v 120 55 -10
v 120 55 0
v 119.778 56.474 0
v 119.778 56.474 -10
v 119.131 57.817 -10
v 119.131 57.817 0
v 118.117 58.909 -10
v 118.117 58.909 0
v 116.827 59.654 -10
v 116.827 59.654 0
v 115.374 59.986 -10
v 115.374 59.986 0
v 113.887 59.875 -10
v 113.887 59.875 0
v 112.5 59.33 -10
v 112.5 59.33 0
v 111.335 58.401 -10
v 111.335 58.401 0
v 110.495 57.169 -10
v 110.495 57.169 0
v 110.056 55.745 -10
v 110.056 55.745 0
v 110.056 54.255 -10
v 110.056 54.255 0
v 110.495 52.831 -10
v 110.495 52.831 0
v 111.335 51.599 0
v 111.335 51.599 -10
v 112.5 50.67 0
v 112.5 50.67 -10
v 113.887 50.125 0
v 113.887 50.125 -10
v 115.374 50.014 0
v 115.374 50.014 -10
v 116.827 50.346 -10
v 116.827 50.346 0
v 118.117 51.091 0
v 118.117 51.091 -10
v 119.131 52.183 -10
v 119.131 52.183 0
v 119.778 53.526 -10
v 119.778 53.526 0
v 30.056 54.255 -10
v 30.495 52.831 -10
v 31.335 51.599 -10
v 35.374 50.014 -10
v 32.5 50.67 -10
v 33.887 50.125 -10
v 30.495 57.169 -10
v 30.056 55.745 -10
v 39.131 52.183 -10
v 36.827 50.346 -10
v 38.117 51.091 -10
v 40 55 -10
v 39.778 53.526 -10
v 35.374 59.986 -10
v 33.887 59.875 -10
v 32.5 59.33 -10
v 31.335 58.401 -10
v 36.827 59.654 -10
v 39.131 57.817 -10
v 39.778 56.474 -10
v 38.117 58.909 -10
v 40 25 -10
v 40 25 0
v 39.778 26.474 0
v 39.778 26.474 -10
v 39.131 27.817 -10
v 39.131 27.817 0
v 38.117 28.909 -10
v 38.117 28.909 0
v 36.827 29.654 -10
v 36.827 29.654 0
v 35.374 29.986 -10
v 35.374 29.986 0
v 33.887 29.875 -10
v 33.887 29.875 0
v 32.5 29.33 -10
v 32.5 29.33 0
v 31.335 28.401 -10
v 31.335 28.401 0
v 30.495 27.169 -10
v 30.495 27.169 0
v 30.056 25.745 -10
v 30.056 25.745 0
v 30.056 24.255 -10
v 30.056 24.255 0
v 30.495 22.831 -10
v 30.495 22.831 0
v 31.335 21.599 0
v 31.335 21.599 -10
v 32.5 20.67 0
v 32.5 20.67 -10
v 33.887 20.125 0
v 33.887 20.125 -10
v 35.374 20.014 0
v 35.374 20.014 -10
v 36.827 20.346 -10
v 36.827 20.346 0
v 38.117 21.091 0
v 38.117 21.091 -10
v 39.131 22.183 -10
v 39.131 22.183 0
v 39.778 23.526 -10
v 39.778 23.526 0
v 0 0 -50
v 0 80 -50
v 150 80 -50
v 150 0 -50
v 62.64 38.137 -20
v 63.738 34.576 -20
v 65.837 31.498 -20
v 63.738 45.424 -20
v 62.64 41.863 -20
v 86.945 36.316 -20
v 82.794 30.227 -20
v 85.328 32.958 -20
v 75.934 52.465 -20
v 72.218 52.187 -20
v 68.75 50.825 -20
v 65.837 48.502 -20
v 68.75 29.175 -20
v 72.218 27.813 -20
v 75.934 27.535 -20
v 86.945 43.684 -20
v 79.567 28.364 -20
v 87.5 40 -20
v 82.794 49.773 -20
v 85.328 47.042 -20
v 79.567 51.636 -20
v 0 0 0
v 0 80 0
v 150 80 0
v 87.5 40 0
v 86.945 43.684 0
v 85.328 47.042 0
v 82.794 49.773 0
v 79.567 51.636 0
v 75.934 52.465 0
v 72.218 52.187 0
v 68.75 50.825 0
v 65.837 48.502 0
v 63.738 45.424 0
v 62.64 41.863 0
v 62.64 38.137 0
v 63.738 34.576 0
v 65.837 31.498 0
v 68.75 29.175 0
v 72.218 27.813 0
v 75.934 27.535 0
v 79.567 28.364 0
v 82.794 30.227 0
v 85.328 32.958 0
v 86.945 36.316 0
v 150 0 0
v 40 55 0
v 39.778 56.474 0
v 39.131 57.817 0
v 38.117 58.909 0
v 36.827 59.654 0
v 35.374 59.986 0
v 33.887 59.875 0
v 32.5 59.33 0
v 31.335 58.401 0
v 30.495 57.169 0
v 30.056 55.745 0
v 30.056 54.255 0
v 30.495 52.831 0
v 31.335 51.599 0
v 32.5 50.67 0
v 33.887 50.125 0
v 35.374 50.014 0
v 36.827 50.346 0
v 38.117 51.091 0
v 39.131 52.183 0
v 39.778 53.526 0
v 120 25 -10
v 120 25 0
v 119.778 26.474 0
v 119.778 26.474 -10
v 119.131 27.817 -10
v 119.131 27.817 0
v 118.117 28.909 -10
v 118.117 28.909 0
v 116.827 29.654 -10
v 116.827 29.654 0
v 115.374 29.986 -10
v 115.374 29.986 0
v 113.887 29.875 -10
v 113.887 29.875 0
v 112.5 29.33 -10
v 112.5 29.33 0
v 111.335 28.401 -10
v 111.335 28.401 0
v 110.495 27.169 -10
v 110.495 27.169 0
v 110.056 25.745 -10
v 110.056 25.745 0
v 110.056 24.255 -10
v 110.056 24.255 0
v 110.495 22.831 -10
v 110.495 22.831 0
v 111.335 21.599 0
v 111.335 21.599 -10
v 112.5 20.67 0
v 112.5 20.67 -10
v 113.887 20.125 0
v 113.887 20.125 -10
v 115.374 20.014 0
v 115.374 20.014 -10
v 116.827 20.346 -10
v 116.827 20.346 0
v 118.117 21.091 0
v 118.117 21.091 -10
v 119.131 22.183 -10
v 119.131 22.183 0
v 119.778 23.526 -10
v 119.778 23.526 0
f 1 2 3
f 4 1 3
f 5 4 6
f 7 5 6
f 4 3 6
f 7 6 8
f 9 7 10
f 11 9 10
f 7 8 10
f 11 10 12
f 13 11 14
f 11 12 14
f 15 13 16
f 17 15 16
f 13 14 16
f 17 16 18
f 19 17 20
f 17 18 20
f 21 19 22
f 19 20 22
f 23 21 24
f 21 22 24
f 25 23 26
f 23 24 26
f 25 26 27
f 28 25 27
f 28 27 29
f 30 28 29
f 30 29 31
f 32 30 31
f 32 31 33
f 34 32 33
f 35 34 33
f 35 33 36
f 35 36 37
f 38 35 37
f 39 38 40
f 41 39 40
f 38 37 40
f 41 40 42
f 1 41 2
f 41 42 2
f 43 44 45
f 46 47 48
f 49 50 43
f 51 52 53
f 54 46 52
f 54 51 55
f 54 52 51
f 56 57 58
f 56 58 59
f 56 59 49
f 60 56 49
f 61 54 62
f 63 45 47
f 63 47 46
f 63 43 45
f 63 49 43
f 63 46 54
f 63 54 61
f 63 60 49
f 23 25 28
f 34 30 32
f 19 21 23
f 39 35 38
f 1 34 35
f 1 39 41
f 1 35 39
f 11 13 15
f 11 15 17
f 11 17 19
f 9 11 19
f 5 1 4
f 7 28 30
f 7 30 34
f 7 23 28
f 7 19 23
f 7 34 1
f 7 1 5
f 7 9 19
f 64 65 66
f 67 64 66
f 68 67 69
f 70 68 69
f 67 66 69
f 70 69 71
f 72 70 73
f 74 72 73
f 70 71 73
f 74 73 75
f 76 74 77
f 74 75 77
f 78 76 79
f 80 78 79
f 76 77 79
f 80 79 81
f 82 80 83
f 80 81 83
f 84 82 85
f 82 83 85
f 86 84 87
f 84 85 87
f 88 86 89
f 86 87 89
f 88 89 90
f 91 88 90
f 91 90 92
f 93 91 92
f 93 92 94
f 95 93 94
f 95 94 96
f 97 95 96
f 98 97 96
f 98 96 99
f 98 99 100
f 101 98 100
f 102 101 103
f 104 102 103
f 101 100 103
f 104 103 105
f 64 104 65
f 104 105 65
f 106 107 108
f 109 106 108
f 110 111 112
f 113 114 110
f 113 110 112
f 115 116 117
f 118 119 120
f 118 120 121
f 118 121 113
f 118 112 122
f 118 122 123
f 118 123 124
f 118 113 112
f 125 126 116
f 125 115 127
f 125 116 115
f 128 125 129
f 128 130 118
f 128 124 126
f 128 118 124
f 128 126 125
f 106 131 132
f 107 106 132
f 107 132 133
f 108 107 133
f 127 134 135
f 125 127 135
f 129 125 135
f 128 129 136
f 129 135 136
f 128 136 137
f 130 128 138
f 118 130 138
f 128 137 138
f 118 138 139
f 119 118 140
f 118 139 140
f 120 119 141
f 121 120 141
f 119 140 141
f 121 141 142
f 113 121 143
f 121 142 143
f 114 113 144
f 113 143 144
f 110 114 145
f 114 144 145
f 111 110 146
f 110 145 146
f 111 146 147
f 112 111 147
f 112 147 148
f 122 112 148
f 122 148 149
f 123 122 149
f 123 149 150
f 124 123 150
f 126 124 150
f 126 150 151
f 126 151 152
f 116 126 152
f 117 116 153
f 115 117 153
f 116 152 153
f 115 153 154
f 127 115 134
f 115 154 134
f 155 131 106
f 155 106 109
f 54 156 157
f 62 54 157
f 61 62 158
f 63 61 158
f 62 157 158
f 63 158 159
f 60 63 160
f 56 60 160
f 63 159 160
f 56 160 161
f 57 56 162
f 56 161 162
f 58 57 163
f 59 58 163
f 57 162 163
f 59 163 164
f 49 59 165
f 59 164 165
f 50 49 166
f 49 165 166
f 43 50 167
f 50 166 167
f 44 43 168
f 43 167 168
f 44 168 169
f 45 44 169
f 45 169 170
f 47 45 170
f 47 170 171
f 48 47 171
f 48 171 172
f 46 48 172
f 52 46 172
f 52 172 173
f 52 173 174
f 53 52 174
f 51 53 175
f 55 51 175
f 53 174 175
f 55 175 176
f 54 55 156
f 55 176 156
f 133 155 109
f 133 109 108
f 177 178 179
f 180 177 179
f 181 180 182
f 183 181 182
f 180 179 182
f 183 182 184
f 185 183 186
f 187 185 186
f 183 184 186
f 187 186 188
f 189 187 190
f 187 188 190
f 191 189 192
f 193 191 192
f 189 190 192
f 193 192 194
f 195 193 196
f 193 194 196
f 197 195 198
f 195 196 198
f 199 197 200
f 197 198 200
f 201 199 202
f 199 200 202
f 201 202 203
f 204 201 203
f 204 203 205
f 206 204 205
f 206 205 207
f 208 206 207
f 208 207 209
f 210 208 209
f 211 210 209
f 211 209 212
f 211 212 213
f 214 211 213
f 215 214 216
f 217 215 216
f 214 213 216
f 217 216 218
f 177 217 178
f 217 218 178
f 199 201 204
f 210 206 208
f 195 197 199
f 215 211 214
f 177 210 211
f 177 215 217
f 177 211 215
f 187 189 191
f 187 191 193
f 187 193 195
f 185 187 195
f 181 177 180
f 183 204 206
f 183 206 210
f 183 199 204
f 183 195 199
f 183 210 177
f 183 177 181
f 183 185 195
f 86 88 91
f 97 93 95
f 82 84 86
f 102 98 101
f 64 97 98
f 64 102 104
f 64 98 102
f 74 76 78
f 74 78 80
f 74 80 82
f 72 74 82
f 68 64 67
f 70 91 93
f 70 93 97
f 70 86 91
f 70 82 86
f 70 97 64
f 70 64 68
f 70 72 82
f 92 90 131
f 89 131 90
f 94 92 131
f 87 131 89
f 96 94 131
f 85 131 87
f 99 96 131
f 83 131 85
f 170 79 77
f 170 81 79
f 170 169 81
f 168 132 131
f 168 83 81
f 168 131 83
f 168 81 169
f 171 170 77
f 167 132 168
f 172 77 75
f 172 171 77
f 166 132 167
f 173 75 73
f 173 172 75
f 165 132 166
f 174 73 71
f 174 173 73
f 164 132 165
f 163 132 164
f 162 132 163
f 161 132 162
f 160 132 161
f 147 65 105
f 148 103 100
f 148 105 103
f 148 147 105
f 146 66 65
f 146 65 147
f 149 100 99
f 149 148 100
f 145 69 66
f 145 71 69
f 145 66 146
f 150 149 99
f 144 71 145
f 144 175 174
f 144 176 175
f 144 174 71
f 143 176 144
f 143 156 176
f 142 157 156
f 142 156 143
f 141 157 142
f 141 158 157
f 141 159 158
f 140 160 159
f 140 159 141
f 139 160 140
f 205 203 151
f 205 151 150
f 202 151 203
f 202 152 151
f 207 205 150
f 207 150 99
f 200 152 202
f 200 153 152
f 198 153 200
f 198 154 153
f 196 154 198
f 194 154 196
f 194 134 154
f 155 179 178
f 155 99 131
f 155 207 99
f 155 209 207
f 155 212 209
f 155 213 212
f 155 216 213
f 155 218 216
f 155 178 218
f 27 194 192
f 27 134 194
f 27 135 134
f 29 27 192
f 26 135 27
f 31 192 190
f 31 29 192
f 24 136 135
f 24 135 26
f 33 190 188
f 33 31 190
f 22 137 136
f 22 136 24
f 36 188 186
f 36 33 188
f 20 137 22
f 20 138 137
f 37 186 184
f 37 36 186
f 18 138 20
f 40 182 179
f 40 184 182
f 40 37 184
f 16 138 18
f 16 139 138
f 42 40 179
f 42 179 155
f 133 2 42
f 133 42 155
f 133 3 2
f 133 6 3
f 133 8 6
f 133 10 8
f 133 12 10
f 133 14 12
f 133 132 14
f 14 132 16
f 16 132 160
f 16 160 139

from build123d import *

# Parameters (mm, degrees)
F0_W     = 150
F0_H     = 80
F1_DEPTH = 50
F2_R     = 12.5
F3_DEPTH = 20
F2_R_2   = 5
F4_DEPTH = 10


with BuildPart() as f1:
    # F0 (on Top) → F1 (new body)
    with BuildSketch(Plane.XY):
        with Locations((75, 40)):
            Rectangle(F0_W, F0_H)
    extrude(amount=-F1_DEPTH)

    # F2 (on face) → F3 (cut)
    with BuildSketch(Plane.XY):
        with Locations((75, 40)):
            Circle(F2_R)
    extrude(amount=-F3_DEPTH, mode=Mode.SUBTRACT)

    # F2 (on face) → F4 (cut)
    with BuildSketch(Plane.XY):
        with Locations((35, 55)):
            Circle(F2_R_2)
        with Locations((115, 55)):
            Circle(F2_R_2)
        with Locations((35, 25)):
            Circle(F2_R_2)
        with Locations((115, 25)):
            Circle(F2_R_2)
    extrude(amount=-F4_DEPTH, mode=Mode.SUBTRACT)


solid = f1.part
